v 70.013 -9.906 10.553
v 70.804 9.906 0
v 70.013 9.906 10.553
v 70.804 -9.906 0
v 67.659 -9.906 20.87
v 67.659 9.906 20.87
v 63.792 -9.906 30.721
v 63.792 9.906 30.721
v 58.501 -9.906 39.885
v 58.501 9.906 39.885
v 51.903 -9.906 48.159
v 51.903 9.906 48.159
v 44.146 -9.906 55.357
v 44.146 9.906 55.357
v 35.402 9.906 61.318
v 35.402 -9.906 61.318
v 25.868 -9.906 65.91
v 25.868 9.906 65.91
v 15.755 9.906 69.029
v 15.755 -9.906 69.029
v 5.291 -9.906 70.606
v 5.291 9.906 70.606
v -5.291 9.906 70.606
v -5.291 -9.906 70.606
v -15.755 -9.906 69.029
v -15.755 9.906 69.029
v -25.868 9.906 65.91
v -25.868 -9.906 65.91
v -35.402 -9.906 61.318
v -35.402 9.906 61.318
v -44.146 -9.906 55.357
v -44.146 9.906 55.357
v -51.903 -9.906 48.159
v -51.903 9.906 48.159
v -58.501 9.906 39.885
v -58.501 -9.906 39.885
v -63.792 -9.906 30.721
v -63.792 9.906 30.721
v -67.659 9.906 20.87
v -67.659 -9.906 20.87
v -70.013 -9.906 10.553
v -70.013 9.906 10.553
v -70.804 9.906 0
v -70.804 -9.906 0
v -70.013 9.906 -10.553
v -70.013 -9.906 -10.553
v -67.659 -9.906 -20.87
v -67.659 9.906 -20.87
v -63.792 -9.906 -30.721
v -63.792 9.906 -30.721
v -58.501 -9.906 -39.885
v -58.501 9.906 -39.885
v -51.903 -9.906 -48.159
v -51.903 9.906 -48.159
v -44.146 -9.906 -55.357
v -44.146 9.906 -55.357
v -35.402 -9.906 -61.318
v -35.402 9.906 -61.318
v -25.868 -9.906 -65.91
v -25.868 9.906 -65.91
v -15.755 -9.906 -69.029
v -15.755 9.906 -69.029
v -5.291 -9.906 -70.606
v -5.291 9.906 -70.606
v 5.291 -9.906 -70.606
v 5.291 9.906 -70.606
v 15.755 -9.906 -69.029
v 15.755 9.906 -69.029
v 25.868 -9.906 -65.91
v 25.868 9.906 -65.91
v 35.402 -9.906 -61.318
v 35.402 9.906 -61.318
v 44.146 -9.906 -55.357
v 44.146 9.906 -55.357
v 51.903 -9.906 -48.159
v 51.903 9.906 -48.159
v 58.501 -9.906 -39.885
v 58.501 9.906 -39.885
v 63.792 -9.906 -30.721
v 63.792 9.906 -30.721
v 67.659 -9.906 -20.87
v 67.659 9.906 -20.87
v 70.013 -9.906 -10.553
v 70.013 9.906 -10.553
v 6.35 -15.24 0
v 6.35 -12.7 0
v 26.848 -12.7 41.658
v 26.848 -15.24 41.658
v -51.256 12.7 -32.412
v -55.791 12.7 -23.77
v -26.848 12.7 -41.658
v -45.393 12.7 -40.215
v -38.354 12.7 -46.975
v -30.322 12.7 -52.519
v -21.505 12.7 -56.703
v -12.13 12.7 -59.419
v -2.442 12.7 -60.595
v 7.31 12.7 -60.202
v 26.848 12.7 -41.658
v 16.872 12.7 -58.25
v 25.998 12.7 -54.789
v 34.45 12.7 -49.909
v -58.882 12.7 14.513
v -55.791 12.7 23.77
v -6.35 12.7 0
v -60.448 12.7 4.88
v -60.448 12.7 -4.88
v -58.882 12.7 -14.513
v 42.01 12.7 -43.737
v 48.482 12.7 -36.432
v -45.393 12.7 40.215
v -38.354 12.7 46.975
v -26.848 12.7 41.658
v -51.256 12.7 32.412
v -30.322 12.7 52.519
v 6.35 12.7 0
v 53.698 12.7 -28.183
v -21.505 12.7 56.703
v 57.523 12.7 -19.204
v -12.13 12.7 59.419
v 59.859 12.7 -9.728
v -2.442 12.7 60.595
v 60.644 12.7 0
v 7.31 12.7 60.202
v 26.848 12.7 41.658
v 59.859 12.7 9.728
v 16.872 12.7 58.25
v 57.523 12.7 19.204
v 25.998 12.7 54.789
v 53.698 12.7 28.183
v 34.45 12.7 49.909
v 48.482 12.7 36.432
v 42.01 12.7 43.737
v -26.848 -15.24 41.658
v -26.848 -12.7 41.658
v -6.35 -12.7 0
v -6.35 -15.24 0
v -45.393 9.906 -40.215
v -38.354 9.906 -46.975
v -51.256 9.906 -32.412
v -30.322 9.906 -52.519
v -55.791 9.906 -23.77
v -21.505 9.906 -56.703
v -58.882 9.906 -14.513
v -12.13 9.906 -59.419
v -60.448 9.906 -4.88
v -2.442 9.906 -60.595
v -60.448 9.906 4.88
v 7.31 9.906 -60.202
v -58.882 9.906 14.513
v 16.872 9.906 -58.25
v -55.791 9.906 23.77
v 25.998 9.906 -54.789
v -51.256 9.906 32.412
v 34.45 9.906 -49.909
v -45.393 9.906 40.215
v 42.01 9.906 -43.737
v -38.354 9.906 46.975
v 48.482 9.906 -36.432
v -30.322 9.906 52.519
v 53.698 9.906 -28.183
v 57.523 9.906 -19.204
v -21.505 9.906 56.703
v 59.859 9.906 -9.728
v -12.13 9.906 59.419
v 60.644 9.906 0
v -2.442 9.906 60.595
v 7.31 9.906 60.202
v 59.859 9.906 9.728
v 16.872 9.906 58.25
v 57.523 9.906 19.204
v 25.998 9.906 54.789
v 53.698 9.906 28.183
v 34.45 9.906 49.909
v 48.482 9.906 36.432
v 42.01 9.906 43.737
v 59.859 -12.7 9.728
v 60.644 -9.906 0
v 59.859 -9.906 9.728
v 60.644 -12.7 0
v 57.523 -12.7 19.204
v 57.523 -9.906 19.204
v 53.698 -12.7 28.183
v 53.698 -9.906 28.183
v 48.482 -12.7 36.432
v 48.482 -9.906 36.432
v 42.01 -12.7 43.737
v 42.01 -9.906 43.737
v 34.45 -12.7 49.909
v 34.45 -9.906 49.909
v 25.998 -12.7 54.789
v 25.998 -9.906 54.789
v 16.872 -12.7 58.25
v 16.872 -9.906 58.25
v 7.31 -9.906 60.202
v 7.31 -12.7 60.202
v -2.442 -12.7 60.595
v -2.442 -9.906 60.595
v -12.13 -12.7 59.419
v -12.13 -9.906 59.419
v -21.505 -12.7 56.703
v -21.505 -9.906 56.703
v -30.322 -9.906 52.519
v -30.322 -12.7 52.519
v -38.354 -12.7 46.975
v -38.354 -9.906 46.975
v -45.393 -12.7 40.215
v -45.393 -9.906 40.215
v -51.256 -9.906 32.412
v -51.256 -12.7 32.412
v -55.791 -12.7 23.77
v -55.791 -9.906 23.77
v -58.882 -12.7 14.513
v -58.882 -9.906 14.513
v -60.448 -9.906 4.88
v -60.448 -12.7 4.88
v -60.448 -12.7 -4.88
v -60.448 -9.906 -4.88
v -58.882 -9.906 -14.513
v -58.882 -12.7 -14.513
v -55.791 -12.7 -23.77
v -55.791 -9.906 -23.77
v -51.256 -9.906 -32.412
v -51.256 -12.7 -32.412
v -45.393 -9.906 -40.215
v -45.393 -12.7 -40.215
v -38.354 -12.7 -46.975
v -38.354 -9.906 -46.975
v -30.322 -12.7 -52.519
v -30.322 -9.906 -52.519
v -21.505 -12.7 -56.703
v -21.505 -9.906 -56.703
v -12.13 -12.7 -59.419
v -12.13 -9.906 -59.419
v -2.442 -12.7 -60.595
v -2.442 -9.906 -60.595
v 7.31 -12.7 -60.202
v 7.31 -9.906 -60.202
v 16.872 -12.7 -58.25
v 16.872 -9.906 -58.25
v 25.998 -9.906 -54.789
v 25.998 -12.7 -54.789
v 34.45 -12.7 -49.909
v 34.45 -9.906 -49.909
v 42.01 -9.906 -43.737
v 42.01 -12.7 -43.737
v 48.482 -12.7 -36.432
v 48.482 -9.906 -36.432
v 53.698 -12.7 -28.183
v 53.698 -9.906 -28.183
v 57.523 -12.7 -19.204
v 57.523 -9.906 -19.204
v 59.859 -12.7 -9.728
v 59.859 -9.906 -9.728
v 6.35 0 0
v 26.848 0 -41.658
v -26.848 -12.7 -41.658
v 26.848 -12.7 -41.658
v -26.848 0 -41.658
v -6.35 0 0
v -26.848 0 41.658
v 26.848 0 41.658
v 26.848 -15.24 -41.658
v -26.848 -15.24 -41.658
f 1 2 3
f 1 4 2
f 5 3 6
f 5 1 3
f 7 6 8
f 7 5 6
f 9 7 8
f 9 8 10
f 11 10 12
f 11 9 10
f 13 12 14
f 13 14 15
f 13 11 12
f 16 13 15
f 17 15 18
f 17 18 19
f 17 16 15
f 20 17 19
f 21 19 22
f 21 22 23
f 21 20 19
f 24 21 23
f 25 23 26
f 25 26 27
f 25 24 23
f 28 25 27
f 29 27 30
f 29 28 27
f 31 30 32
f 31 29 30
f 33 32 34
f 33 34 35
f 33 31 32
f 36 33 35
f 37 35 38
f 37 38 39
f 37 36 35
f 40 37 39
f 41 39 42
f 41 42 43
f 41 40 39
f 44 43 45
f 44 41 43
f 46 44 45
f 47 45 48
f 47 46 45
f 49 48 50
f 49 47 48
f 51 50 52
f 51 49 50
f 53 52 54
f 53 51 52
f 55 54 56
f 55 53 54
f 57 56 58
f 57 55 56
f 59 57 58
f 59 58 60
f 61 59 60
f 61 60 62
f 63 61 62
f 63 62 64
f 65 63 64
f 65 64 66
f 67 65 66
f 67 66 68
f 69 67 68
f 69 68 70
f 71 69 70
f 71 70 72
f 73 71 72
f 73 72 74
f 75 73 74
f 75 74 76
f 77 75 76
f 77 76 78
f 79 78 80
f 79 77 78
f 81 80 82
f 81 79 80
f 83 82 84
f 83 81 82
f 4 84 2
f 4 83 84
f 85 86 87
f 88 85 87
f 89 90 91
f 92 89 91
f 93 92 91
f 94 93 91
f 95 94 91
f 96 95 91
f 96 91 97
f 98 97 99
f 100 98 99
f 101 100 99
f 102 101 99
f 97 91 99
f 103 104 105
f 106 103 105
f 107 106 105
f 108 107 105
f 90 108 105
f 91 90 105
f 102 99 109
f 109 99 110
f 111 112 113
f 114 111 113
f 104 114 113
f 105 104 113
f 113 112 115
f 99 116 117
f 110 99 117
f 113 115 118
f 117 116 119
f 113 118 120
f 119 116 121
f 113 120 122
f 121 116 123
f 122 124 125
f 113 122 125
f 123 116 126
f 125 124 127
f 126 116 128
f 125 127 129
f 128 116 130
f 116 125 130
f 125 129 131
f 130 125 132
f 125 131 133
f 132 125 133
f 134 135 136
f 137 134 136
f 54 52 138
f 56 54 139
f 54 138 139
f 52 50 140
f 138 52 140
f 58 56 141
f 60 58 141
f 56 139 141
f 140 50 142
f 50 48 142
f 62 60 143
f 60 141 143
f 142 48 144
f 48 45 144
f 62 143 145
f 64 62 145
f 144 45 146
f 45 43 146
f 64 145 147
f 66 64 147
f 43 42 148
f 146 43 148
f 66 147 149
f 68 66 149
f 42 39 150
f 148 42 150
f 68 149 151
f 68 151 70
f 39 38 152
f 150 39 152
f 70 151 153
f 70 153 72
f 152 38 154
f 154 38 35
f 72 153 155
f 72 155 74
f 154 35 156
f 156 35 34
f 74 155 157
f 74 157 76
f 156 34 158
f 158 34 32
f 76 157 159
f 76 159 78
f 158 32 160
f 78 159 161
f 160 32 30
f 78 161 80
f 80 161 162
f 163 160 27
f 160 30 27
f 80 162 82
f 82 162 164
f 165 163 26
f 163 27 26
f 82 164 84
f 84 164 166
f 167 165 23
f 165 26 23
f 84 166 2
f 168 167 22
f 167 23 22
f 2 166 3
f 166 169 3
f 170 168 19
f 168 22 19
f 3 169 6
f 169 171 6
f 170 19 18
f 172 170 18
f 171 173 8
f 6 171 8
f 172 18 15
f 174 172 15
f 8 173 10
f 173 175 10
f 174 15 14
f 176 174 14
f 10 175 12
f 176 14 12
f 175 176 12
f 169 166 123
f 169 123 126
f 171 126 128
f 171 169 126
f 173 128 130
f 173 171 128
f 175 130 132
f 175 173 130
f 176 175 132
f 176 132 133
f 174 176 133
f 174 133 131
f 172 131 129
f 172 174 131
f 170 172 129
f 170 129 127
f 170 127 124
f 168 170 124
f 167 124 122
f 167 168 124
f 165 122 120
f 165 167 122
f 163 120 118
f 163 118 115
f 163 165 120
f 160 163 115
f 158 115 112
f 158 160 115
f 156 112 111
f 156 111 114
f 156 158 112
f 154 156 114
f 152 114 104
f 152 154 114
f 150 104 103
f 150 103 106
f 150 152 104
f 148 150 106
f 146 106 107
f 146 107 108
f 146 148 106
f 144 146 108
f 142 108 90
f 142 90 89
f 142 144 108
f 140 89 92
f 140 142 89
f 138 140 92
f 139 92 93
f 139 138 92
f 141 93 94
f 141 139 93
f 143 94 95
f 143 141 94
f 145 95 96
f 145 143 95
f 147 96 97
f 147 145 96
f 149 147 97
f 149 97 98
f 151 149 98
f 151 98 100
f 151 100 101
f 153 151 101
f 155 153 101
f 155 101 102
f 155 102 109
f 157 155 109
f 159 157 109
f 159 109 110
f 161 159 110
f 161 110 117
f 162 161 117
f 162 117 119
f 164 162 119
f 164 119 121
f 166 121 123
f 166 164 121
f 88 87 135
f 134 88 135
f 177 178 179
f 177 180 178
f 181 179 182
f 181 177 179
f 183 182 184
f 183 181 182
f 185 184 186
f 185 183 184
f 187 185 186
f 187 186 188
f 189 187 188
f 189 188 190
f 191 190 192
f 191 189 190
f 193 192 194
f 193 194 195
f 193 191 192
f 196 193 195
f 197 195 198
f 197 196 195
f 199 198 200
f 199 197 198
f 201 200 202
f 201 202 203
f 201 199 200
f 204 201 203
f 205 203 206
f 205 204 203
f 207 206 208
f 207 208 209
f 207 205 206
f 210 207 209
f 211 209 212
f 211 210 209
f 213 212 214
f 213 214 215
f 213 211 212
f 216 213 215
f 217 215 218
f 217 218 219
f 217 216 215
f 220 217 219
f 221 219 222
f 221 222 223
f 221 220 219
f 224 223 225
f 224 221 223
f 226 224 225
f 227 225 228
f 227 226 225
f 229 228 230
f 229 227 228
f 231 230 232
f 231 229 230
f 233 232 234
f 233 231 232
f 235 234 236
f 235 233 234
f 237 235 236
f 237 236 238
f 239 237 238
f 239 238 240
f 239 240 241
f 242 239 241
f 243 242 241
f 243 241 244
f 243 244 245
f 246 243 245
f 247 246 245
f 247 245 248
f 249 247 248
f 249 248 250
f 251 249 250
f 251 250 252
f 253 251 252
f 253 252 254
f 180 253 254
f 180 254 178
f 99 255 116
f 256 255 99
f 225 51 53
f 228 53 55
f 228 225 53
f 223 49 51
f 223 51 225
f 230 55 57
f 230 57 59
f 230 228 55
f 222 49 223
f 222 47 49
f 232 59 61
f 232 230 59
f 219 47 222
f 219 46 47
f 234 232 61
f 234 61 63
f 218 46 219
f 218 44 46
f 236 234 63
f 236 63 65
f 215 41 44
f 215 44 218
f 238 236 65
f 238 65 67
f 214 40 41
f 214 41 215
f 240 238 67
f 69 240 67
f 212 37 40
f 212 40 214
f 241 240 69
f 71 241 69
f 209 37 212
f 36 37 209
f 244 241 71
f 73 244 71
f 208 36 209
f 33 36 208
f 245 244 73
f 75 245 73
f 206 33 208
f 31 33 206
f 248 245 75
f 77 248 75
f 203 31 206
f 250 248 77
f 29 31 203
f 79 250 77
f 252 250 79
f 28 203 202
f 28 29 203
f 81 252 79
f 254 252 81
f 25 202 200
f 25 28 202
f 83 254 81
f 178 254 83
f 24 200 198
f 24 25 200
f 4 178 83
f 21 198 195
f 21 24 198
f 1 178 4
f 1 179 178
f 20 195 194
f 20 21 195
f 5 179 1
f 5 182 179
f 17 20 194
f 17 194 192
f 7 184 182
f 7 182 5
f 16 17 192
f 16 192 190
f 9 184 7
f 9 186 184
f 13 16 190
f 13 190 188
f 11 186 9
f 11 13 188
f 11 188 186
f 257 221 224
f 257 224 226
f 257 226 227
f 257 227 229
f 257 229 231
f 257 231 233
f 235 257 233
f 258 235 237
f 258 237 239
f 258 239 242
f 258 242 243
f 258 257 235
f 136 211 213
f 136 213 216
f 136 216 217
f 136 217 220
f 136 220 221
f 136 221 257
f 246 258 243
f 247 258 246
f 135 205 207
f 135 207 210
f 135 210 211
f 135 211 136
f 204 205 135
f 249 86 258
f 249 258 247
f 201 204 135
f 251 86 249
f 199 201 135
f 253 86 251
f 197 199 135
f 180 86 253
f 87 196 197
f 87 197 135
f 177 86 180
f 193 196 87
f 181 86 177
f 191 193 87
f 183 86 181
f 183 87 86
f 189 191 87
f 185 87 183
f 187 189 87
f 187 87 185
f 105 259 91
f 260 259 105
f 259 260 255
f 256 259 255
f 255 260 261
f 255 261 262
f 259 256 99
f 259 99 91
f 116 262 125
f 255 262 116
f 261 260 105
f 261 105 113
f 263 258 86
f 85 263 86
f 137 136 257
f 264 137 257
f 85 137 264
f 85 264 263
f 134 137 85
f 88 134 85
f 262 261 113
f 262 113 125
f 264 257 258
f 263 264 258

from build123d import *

# Parameters (mm, degrees)
F0_R     = 70.804177
F0_R_2   = 60.644177
F1_DEPTH = 9.906
F2_DEPTH = 12.7
F3_DEPTH = 15.24


with BuildPart() as f1:
    # F0 (on Front) → F1 (new body, symmetric)
    with BuildSketch(Plane.XZ):
        Circle(F0_R)
        Circle(F0_R_2, mode=Mode.SUBTRACT)
    extrude(amount=F1_DEPTH, both=True)

    # F0 (on Front) → F2 (join, symmetric)
    with BuildSketch(Plane.XZ):
        Circle(F0_R_2)
        Polygon((-6.35, 0), (-26.848431, 41.6581), (26.848444, 41.6581), (6.35, 0), (26.84843, -41.658109), (-26.84843, -41.658109), align=None, mode=Mode.SUBTRACT)
    extrude(amount=F2_DEPTH, both=True)

    # F0 (on Front) → F3 (join)
    with BuildSketch(Plane.XZ):
        Polygon((26.848444, 41.6581), (-26.848431, 41.6581), (-6.35, 0), (-26.84843, -41.658109), (26.84843, -41.658109), (6.35, 0), align=None)
    extrude(amount=F3_DEPTH)


solid = f1.part
